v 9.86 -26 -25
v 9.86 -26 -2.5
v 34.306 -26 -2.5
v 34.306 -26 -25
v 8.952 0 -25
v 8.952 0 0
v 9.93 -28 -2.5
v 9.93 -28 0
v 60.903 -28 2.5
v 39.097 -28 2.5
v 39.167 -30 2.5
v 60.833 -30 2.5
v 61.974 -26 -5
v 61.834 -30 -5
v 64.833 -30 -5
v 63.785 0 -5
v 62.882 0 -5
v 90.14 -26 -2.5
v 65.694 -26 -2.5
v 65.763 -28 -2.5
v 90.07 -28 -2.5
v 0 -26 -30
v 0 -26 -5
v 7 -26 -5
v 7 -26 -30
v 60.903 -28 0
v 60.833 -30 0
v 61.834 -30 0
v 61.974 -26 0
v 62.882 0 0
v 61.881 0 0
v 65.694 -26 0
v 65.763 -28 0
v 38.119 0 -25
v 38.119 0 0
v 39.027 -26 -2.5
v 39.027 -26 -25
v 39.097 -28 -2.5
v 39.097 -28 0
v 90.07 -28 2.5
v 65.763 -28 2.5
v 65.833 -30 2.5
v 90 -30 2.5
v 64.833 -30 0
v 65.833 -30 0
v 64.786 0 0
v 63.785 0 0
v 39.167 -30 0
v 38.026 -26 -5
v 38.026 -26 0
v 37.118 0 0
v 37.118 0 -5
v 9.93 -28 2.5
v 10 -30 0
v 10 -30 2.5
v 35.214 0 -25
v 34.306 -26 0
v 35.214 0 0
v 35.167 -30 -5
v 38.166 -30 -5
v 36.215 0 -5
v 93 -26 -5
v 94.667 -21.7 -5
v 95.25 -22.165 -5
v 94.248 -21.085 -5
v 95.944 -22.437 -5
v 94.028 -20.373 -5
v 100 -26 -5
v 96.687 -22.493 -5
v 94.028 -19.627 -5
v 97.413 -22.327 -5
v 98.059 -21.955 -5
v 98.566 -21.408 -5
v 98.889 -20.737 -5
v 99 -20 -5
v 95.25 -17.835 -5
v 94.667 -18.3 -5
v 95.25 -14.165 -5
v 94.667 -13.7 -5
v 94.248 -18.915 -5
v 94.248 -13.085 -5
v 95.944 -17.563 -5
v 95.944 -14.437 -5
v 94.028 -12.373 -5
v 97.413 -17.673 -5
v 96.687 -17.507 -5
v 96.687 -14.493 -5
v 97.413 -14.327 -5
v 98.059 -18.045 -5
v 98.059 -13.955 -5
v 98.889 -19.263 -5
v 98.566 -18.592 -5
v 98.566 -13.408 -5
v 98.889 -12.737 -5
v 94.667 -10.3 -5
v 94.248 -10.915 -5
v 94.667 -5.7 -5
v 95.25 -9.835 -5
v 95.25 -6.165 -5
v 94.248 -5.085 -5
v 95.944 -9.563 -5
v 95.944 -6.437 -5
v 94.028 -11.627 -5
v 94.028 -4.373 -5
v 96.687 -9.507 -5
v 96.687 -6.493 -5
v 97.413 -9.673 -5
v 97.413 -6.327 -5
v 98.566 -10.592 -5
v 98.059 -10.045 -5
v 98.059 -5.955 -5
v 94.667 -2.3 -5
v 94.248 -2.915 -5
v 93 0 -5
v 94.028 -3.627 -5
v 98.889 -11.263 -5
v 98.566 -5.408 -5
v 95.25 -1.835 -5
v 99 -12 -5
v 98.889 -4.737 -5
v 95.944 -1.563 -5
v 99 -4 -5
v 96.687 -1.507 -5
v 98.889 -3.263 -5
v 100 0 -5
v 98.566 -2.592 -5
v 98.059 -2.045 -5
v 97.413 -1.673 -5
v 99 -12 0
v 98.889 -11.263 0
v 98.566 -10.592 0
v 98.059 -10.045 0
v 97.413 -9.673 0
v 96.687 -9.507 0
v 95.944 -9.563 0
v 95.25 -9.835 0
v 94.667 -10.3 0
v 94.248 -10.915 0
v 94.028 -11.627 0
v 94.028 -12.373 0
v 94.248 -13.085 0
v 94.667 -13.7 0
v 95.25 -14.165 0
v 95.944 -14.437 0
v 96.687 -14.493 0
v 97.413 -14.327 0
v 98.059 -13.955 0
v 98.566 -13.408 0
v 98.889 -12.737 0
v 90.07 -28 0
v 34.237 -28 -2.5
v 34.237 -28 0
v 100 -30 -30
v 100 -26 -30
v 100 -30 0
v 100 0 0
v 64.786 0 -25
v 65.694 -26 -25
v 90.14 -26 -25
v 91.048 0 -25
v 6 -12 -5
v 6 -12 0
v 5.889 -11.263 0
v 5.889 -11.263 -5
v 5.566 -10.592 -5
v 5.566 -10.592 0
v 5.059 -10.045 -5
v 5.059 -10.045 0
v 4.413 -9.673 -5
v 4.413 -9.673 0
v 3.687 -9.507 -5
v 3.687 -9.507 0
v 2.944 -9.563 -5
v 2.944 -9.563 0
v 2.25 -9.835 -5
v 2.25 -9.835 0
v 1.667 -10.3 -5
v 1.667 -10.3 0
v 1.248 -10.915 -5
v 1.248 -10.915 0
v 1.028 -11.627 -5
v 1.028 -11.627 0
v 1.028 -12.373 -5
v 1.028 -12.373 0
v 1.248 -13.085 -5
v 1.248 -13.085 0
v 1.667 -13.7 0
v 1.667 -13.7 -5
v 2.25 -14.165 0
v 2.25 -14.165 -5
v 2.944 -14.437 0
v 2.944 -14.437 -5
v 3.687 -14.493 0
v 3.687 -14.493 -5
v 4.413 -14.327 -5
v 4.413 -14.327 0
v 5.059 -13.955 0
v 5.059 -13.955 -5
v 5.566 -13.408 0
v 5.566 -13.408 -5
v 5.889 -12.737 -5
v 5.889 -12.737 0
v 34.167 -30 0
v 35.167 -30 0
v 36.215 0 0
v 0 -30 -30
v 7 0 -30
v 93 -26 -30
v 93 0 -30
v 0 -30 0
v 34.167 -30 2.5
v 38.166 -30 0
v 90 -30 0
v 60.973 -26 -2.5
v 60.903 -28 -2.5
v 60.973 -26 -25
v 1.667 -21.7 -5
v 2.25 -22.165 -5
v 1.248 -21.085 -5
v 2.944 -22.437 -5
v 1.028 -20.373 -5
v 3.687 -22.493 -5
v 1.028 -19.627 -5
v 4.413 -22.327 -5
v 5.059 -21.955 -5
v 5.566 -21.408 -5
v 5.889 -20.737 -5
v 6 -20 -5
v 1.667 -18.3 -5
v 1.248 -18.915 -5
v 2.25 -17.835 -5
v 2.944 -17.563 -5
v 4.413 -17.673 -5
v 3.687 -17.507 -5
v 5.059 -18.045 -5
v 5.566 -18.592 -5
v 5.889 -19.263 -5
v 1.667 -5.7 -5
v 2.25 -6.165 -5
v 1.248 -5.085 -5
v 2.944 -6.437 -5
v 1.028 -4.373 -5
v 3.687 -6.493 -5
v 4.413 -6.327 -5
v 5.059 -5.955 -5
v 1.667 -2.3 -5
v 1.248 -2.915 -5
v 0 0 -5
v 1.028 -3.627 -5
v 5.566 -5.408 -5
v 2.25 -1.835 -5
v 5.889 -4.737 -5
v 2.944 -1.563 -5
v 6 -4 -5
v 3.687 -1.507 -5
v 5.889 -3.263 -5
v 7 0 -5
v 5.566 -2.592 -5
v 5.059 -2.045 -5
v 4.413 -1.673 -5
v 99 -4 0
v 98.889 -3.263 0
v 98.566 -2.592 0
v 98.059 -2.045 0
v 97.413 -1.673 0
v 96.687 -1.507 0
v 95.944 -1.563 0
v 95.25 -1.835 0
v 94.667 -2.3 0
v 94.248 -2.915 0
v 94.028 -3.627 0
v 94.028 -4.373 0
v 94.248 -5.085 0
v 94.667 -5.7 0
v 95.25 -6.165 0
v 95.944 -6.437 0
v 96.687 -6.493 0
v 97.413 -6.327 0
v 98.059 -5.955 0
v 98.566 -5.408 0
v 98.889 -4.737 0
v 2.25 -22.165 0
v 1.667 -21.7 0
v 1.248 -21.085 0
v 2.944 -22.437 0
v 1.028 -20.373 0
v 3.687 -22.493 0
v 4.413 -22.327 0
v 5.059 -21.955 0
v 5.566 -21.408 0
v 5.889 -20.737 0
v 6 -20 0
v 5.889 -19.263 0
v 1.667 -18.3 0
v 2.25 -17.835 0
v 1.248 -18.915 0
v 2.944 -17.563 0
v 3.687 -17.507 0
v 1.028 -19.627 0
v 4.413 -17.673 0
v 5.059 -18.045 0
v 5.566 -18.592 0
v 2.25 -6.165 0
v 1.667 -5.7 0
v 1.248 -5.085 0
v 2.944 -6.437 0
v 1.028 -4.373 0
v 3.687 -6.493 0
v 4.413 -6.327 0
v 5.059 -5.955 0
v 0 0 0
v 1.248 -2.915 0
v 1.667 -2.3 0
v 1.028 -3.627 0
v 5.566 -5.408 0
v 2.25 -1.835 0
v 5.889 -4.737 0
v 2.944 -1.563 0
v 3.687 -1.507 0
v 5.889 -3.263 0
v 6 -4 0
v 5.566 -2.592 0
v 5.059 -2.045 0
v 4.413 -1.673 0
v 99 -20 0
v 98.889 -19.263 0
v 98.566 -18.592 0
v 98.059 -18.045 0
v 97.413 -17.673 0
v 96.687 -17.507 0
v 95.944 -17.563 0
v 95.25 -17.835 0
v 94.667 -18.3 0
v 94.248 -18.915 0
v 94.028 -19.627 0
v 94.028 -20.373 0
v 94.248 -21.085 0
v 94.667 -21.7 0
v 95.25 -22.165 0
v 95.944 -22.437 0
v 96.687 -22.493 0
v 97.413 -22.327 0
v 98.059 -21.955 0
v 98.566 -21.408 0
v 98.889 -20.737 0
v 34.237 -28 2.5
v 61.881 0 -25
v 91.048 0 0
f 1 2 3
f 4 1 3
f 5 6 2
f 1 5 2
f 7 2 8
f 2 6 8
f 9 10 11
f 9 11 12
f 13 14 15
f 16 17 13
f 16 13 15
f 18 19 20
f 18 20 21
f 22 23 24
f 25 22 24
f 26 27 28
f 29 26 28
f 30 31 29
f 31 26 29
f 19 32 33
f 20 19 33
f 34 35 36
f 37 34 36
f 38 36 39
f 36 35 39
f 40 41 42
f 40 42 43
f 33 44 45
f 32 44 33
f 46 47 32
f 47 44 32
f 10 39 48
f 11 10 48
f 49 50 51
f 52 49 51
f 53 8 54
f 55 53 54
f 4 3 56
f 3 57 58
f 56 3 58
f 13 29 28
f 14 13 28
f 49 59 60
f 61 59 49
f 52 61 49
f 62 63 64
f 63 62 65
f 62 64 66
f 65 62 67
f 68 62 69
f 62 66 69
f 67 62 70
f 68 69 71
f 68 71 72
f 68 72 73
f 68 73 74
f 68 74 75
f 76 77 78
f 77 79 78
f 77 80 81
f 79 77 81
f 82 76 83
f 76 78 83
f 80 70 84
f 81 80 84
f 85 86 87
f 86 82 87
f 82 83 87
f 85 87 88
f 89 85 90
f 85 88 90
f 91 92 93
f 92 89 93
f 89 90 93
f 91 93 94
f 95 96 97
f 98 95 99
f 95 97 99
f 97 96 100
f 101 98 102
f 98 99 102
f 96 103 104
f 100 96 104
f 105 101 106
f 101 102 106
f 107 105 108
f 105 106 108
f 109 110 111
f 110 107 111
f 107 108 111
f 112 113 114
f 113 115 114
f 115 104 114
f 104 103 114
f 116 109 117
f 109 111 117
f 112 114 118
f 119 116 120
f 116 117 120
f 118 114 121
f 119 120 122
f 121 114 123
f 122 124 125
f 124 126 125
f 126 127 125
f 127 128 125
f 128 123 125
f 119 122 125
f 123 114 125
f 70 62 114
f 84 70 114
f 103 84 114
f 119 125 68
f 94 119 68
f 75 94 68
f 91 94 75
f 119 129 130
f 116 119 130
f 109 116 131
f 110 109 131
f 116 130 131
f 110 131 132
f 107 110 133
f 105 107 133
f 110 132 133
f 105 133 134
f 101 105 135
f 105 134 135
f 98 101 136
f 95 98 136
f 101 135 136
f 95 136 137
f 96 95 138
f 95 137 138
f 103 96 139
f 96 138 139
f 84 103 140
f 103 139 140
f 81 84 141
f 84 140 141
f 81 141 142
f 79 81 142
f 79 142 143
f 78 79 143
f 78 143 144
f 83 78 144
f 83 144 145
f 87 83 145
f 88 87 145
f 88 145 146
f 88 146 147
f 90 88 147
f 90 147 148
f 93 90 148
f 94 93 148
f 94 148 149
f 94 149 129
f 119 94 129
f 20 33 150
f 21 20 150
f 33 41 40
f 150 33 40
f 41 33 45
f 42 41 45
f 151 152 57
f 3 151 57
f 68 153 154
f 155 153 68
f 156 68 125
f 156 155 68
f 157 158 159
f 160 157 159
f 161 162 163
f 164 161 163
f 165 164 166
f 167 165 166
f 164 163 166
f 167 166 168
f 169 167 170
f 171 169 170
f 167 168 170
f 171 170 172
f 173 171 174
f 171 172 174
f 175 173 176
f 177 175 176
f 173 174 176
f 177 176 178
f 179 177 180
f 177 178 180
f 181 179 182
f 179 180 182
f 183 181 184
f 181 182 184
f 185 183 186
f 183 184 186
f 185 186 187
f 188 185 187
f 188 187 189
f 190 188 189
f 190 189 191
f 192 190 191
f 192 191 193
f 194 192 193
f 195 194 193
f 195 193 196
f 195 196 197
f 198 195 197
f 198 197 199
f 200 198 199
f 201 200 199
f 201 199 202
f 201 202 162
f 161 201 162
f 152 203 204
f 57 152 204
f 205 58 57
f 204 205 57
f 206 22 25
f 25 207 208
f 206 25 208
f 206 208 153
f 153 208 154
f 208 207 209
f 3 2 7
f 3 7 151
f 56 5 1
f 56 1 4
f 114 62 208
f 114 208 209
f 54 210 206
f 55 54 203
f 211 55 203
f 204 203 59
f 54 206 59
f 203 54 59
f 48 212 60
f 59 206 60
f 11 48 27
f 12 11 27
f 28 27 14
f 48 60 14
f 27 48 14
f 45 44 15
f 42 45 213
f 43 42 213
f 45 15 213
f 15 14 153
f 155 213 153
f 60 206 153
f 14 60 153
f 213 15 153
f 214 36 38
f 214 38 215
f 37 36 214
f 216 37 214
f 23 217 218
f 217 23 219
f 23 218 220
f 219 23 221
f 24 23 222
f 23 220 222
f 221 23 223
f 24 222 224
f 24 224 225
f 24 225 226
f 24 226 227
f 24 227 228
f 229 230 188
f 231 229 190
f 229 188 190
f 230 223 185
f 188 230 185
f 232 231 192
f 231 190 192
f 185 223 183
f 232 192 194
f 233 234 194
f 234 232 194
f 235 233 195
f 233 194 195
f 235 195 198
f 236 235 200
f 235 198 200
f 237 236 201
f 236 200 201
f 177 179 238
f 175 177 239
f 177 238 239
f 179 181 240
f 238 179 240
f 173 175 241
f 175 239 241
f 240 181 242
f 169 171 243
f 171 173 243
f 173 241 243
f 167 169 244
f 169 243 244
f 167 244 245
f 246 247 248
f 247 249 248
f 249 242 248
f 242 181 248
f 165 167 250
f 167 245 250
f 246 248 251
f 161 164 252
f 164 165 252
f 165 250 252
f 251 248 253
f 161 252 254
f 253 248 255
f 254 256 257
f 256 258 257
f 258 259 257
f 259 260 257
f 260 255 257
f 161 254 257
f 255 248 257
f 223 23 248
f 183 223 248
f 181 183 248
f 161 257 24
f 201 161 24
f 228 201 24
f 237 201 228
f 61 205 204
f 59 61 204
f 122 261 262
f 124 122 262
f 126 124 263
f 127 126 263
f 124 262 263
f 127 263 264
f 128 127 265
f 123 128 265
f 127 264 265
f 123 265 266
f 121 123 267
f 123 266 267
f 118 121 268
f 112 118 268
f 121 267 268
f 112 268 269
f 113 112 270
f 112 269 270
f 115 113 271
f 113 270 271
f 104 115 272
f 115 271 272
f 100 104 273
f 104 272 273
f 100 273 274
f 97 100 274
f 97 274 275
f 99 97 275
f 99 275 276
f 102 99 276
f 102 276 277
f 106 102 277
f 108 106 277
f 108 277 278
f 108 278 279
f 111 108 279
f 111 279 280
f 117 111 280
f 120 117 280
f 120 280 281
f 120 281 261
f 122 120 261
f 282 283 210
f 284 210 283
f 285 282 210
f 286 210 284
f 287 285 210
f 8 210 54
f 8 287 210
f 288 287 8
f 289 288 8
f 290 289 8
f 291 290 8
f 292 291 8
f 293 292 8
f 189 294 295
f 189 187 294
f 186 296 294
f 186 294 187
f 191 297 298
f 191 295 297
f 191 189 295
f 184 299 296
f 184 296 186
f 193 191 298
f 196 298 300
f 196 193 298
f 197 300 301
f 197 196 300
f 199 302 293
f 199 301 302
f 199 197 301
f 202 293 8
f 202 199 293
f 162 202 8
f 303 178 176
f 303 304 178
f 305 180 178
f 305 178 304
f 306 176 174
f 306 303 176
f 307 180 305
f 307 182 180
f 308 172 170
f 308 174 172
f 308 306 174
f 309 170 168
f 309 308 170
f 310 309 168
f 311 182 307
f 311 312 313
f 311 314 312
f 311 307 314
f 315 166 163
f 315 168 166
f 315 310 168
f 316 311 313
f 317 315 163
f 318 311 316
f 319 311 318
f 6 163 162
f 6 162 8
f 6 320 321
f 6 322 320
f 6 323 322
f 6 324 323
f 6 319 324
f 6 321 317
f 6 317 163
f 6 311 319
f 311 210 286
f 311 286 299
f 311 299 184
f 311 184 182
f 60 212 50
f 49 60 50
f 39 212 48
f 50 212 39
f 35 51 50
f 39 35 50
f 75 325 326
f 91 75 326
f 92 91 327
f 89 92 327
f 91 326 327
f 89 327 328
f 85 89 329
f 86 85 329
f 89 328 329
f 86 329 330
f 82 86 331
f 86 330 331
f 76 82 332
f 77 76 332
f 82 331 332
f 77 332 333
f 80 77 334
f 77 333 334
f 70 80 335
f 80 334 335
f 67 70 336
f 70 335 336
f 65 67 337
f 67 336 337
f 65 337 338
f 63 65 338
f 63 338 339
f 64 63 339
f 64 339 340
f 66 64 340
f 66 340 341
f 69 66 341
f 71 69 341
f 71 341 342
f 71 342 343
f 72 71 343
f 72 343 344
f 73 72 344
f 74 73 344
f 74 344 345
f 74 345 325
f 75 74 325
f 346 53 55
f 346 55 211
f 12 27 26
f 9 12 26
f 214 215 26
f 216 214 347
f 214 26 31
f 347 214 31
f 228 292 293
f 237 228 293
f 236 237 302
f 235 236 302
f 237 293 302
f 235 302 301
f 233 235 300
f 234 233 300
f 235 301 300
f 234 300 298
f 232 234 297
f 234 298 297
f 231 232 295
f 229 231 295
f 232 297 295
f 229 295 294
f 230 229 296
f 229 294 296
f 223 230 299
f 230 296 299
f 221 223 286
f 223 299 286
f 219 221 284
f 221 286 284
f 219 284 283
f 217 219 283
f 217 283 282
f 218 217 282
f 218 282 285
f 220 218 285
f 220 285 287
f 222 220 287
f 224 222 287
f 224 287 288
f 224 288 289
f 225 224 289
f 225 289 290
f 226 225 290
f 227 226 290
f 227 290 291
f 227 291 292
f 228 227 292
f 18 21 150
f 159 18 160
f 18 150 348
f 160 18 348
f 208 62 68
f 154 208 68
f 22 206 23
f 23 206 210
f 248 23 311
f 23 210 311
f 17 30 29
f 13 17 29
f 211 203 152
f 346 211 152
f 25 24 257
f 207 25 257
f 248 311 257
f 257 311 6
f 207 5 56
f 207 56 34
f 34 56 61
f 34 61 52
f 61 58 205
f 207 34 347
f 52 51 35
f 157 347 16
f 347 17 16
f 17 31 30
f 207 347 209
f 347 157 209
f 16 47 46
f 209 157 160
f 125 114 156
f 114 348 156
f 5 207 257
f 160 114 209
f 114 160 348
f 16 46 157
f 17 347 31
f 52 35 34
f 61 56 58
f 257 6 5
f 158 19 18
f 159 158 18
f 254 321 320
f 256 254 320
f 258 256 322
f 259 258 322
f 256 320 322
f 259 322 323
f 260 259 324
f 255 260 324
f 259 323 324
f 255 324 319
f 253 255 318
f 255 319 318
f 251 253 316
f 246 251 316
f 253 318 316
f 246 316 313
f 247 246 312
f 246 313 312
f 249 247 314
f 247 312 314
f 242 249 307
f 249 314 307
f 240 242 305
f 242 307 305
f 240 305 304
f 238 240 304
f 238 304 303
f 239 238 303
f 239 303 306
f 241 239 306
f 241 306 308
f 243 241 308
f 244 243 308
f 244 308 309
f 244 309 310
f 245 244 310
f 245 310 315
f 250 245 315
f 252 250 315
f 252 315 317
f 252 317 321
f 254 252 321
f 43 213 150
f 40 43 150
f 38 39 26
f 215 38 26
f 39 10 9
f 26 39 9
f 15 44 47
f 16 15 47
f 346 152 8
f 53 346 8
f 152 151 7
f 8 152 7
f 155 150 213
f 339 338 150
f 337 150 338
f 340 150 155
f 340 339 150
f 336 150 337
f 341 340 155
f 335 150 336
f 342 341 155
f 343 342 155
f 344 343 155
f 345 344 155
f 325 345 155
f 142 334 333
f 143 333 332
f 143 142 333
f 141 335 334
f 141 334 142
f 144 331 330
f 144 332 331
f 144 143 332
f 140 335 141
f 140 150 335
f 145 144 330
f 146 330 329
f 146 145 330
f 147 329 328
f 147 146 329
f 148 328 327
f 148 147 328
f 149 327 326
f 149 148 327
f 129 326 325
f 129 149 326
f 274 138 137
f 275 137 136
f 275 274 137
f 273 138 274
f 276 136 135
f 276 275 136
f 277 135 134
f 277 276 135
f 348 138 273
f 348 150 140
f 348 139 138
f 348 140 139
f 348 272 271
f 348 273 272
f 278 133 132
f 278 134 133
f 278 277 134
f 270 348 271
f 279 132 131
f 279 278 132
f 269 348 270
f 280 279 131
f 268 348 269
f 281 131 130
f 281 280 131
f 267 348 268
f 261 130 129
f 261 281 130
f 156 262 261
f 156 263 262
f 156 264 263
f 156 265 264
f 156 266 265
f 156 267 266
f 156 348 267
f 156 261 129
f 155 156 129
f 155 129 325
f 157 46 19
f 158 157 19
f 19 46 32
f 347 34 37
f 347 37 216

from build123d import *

# Parameters (mm, degrees)
SKETCH3_W           = 100
SKETCH3_H           = 30
BOSS_EXTRUDE1_DEPTH = 30
SKETCH3_6_R         = 2.5
CUT_EXTRUDE1_DEPTH  = 25
CUT_EXTRUDE2_DEPTH  = 5
CUT_EXTRUDE3_START  = -5
SKETCH3_9_W         = 7
SKETCH3_9_H         = 26
CUT_EXTRUDE3_DEPTH  = 104.627804912
CUT_EXTRUDE4_DEPTH  = 2.5
BOSS_EXTRUDE2_DEPTH = 2.5


with BuildPart() as part:
    # Sketch3 → Boss-Extrude1 (new body)
    with BuildSketch(Plane.XY):
        with Locations((50, -15)):
            Rectangle(SKETCH3_W, SKETCH3_H)
    extrude(amount=-BOSS_EXTRUDE1_DEPTH)

    # Sketch3<6> → Cut-Extrude1 (cut)
    with BuildSketch(Plane.XY):
        Polygon((35.214289751, 0), (8.952376915, 0), (9.860316922, -26), (34.306349745, -26), align=None)
        Polygon((61.880956418, 0), (38.119043582, 0), (39.026983589, -26), (60.973016411, -26), align=None)
        Polygon((91.047623085, 0), (64.785710249, 0), (65.693650255, -26), (90.139683078, -26), align=None)
        with Locations((3.5, -4)):
            Circle(SKETCH3_6_R)
        with Locations((3.5, -12)):
            Circle(SKETCH3_6_R)
        with Locations((3.5, -20)):
            Circle(SKETCH3_6_R)
        with Locations((96.5, -4)):
            Circle(SKETCH3_6_R)
        with Locations((96.5, -12)):
            Circle(SKETCH3_6_R)
        with Locations((96.5, -20)):
            Circle(SKETCH3_6_R)
    extrude(amount=-CUT_EXTRUDE1_DEPTH, mode=Mode.SUBTRACT)

    # Sketch3<8> → Cut-Extrude2 (cut)
    with BuildSketch(Plane.XY):
        Polygon((37.118434038, 0), (36.214899296, 0), (35.167276211, -30), (38.166057122, -30), align=None)
        Polygon((63.785100704, 0), (62.881565962, 0), (61.833942878, -30), (64.832723789, -30), align=None)
    extrude(amount=-CUT_EXTRUDE2_DEPTH, mode=Mode.SUBTRACT)

    # Sketch3<9> → Cut-Extrude3 (cut, through all)
    with BuildSketch(Plane.XY.offset(CUT_EXTRUDE3_START)):
        with Locations((3.5, -13)):
            Rectangle(SKETCH3_9_W, SKETCH3_9_H)
        with Locations((96.5, -13)):
            Rectangle(SKETCH3_9_W, SKETCH3_9_H)
    extrude(amount=-CUT_EXTRUDE3_DEPTH, mode=Mode.SUBTRACT)

    # Sketch3<10> → Cut-Extrude4 (cut)
    with BuildSketch(Plane.XY):
        Polygon((34.306349745, -26), (9.860316922, -26), (9.930158461, -28), (34.236508206, -28), align=None)
        Polygon((60.973016411, -26), (39.026983589, -26), (39.096825128, -28), (60.903174872, -28), align=None)
        Polygon((90.139683078, -26), (65.693650255, -26), (65.763491794, -28), (90.069841539, -28), align=None)
    extrude(amount=-CUT_EXTRUDE4_DEPTH, mode=Mode.SUBTRACT)

    # Sketch3<11> → Boss-Extrude2 (add)
    with BuildSketch(Plane.XY):
        Polygon((34.236508206, -28), (9.930158461, -28), (10, -30), (34.166666667, -30), align=None)
        Polygon((60.903174872, -28), (39.096825128, -28), (39.166666667, -30), (60.833333333, -30), align=None)
        Polygon((90.069841539, -28), (65.763491794, -28), (65.833333333, -30), (90, -30), align=None)
    extrude(amount=BOSS_EXTRUDE2_DEPTH)


solid = part.part
